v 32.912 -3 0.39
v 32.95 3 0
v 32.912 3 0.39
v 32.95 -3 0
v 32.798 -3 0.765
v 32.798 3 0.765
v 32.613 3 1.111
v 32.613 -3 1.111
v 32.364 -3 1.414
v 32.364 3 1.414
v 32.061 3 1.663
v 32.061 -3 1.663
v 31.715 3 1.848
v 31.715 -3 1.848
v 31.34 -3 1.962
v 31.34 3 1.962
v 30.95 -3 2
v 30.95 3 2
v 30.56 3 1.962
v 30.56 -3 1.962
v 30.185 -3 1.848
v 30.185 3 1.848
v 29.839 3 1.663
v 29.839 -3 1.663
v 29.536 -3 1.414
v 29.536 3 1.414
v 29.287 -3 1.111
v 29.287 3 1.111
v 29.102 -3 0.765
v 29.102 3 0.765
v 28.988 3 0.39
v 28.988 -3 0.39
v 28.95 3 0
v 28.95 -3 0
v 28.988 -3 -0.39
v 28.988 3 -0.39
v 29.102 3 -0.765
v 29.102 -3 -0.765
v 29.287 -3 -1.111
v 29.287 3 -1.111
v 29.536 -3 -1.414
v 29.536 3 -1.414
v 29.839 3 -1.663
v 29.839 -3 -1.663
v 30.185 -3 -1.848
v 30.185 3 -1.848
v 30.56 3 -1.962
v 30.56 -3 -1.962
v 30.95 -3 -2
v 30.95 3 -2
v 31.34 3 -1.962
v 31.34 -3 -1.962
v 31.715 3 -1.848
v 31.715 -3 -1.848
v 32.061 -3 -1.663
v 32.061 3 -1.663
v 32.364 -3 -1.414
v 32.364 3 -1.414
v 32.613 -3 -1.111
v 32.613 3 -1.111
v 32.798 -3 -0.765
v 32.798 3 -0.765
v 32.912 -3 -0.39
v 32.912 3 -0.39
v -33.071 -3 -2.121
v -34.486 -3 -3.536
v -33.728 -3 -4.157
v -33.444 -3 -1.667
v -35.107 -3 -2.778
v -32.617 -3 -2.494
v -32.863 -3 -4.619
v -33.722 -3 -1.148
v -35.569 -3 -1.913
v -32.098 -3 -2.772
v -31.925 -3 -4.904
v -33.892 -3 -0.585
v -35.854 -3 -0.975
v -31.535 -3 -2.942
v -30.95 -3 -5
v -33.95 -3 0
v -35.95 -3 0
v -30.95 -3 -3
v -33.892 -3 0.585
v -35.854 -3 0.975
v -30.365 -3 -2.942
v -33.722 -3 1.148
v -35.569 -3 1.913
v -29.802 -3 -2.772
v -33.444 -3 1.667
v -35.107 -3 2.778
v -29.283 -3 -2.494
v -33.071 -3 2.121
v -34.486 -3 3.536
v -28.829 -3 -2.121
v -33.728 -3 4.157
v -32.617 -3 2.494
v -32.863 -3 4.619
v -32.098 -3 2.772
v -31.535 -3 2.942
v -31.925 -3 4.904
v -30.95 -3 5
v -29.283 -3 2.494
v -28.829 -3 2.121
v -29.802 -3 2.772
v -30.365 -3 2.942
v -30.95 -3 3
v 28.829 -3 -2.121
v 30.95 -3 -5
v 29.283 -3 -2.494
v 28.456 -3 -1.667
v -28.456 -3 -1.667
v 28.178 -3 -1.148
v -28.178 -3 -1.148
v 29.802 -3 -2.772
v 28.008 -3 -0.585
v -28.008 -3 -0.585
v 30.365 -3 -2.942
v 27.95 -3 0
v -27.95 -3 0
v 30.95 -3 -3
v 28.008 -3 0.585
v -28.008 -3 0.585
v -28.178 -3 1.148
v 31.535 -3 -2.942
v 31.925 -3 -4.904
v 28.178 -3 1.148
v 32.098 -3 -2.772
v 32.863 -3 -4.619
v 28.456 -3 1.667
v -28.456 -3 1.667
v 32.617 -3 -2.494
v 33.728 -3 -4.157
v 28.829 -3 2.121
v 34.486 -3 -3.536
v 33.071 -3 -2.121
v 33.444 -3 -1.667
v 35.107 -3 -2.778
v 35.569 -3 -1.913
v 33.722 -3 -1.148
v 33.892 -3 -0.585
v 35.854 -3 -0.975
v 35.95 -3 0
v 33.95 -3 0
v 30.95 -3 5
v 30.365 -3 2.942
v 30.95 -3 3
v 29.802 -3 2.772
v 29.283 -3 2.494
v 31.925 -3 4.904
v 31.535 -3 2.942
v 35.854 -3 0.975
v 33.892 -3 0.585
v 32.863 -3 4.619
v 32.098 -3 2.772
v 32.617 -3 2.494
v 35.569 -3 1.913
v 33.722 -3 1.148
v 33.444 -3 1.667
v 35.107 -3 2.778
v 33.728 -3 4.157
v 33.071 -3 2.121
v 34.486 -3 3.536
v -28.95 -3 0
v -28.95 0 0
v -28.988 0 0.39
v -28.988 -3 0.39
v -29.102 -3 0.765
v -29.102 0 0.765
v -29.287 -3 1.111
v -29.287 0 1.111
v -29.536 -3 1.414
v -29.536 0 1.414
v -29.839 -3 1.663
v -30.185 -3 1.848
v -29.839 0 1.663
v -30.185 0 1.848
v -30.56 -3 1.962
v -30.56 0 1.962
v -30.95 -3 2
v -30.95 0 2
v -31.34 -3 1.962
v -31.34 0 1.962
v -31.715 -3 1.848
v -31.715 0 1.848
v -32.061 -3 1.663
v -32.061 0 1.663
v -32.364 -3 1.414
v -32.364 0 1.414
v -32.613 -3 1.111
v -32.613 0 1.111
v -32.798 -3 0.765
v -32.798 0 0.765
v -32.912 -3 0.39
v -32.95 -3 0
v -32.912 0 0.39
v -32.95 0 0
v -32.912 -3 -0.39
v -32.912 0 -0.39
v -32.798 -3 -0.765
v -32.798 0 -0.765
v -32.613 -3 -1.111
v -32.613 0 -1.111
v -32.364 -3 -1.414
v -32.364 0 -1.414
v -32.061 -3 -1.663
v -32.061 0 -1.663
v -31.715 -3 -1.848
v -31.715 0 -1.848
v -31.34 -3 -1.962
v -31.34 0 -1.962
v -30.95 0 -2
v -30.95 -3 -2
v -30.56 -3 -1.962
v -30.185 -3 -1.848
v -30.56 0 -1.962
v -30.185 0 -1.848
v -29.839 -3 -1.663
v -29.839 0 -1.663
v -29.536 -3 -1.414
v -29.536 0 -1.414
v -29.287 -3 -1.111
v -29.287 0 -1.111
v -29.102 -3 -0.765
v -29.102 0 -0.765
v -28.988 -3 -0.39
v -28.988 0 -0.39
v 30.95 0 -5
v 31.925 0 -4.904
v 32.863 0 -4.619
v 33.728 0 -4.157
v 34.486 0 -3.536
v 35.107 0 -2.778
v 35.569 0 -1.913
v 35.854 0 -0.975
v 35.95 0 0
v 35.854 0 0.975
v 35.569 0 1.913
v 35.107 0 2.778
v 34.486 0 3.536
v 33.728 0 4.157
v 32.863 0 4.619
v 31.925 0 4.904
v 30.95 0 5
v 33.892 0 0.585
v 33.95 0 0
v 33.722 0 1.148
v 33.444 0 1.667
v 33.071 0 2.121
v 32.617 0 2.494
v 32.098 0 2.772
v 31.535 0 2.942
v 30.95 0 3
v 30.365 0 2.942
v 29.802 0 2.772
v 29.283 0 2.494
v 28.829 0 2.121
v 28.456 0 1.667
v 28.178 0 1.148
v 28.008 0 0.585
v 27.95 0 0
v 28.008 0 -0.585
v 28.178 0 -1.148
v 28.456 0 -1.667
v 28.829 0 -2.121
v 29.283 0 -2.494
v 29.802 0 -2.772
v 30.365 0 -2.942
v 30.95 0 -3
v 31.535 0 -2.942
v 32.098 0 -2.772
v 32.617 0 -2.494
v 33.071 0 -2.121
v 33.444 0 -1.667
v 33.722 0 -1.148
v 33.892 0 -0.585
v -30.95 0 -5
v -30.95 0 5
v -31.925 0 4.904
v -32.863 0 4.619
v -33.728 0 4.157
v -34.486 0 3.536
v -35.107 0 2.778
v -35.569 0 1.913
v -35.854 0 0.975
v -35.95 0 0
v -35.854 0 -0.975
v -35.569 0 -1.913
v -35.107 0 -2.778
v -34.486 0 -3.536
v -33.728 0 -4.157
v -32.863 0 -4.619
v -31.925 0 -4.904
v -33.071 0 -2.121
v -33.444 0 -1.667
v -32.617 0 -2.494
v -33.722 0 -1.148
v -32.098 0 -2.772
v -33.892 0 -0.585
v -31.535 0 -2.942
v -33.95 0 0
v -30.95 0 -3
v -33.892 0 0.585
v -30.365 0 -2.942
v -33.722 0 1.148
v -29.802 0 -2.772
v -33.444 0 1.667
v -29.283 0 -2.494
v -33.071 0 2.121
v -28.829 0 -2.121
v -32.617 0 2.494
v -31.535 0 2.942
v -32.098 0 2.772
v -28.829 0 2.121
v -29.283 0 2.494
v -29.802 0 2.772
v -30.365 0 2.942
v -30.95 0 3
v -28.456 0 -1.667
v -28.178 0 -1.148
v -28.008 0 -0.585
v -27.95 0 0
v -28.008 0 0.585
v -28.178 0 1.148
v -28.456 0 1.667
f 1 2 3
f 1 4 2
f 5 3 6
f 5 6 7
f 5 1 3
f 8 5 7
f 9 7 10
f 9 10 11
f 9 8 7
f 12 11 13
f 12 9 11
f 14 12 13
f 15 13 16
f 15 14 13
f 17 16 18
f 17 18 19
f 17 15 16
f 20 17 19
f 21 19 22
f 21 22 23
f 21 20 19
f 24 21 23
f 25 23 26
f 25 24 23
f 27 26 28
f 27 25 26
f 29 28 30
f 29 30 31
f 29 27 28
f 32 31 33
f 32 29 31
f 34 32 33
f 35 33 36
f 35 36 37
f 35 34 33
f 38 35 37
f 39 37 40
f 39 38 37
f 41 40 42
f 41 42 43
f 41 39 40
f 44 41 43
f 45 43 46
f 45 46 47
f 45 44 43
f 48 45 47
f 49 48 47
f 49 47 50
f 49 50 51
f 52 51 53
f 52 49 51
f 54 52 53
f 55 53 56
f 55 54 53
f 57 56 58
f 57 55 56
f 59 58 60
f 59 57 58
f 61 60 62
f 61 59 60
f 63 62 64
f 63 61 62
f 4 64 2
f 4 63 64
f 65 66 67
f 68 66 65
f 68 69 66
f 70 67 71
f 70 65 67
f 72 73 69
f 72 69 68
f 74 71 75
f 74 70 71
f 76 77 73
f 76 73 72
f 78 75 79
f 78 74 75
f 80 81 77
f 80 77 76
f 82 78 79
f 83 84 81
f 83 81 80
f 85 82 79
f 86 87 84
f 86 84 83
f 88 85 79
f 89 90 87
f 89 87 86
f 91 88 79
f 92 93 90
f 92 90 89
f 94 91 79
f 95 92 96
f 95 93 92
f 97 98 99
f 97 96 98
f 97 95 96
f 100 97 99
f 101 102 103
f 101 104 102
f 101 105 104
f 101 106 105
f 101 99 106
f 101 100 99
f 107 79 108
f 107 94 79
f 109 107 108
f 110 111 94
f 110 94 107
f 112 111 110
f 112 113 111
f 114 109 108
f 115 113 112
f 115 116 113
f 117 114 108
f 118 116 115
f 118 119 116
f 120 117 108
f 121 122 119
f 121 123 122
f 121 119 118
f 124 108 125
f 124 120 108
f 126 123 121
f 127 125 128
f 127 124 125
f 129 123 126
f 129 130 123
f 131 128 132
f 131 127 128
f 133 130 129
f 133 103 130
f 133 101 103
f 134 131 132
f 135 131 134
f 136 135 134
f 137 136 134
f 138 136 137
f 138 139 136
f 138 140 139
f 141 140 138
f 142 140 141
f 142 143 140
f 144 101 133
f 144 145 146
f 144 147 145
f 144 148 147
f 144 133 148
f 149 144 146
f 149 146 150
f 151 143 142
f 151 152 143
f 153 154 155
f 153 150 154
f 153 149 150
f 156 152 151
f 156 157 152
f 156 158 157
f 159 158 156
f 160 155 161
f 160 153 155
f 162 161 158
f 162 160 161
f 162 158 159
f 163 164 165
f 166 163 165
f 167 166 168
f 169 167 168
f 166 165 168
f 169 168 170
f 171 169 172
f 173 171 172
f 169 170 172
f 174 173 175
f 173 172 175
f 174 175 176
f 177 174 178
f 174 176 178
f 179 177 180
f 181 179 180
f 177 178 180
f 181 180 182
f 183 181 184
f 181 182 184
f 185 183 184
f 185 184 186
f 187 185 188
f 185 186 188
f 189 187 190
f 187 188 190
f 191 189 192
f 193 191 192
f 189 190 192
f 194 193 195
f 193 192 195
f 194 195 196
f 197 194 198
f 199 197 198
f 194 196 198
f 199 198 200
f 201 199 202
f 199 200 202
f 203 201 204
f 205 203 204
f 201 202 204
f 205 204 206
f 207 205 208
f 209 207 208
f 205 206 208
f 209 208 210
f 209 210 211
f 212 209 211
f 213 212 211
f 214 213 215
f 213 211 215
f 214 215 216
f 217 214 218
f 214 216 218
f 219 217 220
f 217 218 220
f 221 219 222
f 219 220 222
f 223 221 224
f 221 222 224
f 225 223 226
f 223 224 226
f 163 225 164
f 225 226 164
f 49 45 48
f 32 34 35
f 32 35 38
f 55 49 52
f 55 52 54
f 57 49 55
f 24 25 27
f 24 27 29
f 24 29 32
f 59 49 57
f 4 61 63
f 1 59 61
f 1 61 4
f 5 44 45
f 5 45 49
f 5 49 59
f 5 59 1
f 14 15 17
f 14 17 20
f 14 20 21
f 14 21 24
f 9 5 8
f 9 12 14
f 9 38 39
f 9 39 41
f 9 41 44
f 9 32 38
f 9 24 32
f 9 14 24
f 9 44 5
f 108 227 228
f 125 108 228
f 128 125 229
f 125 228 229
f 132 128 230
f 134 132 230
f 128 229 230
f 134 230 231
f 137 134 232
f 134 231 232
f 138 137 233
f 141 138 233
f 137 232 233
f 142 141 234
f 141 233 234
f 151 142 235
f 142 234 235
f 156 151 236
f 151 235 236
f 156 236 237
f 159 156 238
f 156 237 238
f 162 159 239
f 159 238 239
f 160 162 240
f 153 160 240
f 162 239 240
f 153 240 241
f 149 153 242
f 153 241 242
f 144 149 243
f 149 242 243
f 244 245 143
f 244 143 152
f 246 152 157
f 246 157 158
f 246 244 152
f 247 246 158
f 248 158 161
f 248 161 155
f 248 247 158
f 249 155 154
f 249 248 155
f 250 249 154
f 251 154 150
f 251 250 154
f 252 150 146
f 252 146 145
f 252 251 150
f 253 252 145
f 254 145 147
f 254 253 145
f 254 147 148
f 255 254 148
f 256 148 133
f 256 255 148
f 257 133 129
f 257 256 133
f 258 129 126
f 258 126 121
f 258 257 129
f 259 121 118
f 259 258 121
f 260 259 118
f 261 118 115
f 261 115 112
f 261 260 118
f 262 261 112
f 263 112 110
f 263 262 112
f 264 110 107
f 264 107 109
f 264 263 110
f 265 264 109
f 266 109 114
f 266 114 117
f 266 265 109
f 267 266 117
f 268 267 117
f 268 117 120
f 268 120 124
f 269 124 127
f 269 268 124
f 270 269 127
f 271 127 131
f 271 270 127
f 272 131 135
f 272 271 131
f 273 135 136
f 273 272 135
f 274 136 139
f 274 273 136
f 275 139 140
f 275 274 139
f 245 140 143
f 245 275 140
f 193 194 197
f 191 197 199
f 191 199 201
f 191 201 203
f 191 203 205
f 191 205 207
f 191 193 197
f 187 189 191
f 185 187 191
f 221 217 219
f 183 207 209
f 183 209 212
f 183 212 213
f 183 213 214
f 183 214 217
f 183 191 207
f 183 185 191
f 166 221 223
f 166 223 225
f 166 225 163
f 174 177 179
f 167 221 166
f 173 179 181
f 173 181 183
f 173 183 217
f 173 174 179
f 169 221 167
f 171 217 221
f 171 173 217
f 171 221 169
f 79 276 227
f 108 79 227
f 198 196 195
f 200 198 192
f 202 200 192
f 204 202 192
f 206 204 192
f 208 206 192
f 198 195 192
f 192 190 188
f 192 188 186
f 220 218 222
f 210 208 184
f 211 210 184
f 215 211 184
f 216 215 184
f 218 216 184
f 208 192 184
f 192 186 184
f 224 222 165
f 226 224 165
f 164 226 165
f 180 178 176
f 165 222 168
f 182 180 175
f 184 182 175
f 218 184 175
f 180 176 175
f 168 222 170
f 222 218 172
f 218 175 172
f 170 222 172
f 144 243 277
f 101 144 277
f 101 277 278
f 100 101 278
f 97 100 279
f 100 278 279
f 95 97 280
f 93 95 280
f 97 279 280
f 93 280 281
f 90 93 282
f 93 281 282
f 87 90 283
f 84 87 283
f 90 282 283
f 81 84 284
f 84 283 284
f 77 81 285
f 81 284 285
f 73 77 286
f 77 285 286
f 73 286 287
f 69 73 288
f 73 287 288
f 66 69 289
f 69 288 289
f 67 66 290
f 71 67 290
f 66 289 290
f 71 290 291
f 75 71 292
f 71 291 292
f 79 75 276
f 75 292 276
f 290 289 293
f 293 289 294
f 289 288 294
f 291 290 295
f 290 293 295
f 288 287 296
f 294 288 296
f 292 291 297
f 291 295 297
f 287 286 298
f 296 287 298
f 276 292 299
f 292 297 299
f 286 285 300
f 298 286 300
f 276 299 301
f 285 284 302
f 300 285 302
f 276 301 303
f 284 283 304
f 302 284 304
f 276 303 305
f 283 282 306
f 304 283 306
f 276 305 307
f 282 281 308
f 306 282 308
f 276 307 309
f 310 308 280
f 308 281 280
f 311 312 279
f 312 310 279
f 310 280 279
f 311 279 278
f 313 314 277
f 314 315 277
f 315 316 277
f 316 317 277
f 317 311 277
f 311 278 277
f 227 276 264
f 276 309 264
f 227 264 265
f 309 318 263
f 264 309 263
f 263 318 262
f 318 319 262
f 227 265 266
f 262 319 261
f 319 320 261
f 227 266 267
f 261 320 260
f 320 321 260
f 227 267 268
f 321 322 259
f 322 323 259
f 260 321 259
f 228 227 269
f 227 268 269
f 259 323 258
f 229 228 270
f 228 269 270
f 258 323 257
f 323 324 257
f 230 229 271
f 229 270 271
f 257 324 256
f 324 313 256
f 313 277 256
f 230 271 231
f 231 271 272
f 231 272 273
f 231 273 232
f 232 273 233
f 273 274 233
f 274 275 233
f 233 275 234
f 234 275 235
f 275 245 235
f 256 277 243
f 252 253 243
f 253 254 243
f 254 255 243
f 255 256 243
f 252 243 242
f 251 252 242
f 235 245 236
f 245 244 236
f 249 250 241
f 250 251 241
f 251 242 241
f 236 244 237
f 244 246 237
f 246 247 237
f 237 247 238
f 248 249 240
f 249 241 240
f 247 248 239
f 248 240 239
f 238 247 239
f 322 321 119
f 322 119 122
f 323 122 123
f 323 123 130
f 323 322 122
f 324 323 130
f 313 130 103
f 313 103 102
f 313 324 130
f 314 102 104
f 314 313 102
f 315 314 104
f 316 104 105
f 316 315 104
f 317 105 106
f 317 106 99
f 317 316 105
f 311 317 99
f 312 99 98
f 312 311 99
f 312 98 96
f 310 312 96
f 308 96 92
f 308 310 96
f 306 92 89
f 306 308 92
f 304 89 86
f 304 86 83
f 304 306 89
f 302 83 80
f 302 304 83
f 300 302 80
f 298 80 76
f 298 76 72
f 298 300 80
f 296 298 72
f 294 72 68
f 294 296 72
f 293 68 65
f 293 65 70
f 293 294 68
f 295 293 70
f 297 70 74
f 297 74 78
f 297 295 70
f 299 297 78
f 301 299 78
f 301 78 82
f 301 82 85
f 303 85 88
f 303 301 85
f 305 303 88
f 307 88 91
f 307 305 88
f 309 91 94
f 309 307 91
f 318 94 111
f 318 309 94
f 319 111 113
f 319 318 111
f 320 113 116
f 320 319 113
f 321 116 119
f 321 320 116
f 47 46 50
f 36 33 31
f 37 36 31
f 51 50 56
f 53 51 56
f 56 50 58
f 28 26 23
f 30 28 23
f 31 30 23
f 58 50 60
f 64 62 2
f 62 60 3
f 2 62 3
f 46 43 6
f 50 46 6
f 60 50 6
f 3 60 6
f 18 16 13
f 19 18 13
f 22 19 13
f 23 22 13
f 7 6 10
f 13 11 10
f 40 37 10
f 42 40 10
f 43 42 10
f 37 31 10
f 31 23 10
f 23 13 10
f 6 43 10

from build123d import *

# Parameters (mm, degrees)
F0_R     = 3
F1_DEPTH = 3
F0_R_2   = 2
F2_DEPTH = 3


with BuildPart() as f1:
    # F0 (on Front) → F1 (new body)
    with BuildSketch(Plane.XZ):
        with BuildLine():
            Line((30.95, 5), (-30.95, 5))
            ThreePointArc((-30.95, 5), (-35.95, 0), (-30.95, -5))
            Line((-30.95, -5), (30.95, -5))
            ThreePointArc((30.95, -5), (35.95, 0), (30.95, 5))
        make_face()
        with Locations((-30.95, 0)):
            Circle(F0_R, mode=Mode.SUBTRACT)
        with Locations((30.95, 0)):
            Circle(F0_R, mode=Mode.SUBTRACT)
    extrude(amount=F1_DEPTH)


with BuildPart() as f1b:
    # F0 (on Front) → F1, piece 2 (new body)
    with BuildSketch(Plane.XZ):
        with Locations((-30.95, 0)):
            Circle(F0_R_2)
    extrude(amount=F1_DEPTH)


with BuildPart() as f1c:
    # F0 (on Front) → F1, piece 3 (new body)
    with BuildSketch(Plane.XZ):
        with Locations((30.95, 0)):
            Circle(F0_R_2)
    extrude(amount=F1_DEPTH)

    # F2 (add): a face of the model
    f2_faces = [f1c.faces().sort_by_distance(p)[0] for p in [
        (30.95, 0, 0),
    ]]
    extrude(f2_faces, amount=F2_DEPTH)


solid = Compound([f1.part, f1b.part, f1c.part])
